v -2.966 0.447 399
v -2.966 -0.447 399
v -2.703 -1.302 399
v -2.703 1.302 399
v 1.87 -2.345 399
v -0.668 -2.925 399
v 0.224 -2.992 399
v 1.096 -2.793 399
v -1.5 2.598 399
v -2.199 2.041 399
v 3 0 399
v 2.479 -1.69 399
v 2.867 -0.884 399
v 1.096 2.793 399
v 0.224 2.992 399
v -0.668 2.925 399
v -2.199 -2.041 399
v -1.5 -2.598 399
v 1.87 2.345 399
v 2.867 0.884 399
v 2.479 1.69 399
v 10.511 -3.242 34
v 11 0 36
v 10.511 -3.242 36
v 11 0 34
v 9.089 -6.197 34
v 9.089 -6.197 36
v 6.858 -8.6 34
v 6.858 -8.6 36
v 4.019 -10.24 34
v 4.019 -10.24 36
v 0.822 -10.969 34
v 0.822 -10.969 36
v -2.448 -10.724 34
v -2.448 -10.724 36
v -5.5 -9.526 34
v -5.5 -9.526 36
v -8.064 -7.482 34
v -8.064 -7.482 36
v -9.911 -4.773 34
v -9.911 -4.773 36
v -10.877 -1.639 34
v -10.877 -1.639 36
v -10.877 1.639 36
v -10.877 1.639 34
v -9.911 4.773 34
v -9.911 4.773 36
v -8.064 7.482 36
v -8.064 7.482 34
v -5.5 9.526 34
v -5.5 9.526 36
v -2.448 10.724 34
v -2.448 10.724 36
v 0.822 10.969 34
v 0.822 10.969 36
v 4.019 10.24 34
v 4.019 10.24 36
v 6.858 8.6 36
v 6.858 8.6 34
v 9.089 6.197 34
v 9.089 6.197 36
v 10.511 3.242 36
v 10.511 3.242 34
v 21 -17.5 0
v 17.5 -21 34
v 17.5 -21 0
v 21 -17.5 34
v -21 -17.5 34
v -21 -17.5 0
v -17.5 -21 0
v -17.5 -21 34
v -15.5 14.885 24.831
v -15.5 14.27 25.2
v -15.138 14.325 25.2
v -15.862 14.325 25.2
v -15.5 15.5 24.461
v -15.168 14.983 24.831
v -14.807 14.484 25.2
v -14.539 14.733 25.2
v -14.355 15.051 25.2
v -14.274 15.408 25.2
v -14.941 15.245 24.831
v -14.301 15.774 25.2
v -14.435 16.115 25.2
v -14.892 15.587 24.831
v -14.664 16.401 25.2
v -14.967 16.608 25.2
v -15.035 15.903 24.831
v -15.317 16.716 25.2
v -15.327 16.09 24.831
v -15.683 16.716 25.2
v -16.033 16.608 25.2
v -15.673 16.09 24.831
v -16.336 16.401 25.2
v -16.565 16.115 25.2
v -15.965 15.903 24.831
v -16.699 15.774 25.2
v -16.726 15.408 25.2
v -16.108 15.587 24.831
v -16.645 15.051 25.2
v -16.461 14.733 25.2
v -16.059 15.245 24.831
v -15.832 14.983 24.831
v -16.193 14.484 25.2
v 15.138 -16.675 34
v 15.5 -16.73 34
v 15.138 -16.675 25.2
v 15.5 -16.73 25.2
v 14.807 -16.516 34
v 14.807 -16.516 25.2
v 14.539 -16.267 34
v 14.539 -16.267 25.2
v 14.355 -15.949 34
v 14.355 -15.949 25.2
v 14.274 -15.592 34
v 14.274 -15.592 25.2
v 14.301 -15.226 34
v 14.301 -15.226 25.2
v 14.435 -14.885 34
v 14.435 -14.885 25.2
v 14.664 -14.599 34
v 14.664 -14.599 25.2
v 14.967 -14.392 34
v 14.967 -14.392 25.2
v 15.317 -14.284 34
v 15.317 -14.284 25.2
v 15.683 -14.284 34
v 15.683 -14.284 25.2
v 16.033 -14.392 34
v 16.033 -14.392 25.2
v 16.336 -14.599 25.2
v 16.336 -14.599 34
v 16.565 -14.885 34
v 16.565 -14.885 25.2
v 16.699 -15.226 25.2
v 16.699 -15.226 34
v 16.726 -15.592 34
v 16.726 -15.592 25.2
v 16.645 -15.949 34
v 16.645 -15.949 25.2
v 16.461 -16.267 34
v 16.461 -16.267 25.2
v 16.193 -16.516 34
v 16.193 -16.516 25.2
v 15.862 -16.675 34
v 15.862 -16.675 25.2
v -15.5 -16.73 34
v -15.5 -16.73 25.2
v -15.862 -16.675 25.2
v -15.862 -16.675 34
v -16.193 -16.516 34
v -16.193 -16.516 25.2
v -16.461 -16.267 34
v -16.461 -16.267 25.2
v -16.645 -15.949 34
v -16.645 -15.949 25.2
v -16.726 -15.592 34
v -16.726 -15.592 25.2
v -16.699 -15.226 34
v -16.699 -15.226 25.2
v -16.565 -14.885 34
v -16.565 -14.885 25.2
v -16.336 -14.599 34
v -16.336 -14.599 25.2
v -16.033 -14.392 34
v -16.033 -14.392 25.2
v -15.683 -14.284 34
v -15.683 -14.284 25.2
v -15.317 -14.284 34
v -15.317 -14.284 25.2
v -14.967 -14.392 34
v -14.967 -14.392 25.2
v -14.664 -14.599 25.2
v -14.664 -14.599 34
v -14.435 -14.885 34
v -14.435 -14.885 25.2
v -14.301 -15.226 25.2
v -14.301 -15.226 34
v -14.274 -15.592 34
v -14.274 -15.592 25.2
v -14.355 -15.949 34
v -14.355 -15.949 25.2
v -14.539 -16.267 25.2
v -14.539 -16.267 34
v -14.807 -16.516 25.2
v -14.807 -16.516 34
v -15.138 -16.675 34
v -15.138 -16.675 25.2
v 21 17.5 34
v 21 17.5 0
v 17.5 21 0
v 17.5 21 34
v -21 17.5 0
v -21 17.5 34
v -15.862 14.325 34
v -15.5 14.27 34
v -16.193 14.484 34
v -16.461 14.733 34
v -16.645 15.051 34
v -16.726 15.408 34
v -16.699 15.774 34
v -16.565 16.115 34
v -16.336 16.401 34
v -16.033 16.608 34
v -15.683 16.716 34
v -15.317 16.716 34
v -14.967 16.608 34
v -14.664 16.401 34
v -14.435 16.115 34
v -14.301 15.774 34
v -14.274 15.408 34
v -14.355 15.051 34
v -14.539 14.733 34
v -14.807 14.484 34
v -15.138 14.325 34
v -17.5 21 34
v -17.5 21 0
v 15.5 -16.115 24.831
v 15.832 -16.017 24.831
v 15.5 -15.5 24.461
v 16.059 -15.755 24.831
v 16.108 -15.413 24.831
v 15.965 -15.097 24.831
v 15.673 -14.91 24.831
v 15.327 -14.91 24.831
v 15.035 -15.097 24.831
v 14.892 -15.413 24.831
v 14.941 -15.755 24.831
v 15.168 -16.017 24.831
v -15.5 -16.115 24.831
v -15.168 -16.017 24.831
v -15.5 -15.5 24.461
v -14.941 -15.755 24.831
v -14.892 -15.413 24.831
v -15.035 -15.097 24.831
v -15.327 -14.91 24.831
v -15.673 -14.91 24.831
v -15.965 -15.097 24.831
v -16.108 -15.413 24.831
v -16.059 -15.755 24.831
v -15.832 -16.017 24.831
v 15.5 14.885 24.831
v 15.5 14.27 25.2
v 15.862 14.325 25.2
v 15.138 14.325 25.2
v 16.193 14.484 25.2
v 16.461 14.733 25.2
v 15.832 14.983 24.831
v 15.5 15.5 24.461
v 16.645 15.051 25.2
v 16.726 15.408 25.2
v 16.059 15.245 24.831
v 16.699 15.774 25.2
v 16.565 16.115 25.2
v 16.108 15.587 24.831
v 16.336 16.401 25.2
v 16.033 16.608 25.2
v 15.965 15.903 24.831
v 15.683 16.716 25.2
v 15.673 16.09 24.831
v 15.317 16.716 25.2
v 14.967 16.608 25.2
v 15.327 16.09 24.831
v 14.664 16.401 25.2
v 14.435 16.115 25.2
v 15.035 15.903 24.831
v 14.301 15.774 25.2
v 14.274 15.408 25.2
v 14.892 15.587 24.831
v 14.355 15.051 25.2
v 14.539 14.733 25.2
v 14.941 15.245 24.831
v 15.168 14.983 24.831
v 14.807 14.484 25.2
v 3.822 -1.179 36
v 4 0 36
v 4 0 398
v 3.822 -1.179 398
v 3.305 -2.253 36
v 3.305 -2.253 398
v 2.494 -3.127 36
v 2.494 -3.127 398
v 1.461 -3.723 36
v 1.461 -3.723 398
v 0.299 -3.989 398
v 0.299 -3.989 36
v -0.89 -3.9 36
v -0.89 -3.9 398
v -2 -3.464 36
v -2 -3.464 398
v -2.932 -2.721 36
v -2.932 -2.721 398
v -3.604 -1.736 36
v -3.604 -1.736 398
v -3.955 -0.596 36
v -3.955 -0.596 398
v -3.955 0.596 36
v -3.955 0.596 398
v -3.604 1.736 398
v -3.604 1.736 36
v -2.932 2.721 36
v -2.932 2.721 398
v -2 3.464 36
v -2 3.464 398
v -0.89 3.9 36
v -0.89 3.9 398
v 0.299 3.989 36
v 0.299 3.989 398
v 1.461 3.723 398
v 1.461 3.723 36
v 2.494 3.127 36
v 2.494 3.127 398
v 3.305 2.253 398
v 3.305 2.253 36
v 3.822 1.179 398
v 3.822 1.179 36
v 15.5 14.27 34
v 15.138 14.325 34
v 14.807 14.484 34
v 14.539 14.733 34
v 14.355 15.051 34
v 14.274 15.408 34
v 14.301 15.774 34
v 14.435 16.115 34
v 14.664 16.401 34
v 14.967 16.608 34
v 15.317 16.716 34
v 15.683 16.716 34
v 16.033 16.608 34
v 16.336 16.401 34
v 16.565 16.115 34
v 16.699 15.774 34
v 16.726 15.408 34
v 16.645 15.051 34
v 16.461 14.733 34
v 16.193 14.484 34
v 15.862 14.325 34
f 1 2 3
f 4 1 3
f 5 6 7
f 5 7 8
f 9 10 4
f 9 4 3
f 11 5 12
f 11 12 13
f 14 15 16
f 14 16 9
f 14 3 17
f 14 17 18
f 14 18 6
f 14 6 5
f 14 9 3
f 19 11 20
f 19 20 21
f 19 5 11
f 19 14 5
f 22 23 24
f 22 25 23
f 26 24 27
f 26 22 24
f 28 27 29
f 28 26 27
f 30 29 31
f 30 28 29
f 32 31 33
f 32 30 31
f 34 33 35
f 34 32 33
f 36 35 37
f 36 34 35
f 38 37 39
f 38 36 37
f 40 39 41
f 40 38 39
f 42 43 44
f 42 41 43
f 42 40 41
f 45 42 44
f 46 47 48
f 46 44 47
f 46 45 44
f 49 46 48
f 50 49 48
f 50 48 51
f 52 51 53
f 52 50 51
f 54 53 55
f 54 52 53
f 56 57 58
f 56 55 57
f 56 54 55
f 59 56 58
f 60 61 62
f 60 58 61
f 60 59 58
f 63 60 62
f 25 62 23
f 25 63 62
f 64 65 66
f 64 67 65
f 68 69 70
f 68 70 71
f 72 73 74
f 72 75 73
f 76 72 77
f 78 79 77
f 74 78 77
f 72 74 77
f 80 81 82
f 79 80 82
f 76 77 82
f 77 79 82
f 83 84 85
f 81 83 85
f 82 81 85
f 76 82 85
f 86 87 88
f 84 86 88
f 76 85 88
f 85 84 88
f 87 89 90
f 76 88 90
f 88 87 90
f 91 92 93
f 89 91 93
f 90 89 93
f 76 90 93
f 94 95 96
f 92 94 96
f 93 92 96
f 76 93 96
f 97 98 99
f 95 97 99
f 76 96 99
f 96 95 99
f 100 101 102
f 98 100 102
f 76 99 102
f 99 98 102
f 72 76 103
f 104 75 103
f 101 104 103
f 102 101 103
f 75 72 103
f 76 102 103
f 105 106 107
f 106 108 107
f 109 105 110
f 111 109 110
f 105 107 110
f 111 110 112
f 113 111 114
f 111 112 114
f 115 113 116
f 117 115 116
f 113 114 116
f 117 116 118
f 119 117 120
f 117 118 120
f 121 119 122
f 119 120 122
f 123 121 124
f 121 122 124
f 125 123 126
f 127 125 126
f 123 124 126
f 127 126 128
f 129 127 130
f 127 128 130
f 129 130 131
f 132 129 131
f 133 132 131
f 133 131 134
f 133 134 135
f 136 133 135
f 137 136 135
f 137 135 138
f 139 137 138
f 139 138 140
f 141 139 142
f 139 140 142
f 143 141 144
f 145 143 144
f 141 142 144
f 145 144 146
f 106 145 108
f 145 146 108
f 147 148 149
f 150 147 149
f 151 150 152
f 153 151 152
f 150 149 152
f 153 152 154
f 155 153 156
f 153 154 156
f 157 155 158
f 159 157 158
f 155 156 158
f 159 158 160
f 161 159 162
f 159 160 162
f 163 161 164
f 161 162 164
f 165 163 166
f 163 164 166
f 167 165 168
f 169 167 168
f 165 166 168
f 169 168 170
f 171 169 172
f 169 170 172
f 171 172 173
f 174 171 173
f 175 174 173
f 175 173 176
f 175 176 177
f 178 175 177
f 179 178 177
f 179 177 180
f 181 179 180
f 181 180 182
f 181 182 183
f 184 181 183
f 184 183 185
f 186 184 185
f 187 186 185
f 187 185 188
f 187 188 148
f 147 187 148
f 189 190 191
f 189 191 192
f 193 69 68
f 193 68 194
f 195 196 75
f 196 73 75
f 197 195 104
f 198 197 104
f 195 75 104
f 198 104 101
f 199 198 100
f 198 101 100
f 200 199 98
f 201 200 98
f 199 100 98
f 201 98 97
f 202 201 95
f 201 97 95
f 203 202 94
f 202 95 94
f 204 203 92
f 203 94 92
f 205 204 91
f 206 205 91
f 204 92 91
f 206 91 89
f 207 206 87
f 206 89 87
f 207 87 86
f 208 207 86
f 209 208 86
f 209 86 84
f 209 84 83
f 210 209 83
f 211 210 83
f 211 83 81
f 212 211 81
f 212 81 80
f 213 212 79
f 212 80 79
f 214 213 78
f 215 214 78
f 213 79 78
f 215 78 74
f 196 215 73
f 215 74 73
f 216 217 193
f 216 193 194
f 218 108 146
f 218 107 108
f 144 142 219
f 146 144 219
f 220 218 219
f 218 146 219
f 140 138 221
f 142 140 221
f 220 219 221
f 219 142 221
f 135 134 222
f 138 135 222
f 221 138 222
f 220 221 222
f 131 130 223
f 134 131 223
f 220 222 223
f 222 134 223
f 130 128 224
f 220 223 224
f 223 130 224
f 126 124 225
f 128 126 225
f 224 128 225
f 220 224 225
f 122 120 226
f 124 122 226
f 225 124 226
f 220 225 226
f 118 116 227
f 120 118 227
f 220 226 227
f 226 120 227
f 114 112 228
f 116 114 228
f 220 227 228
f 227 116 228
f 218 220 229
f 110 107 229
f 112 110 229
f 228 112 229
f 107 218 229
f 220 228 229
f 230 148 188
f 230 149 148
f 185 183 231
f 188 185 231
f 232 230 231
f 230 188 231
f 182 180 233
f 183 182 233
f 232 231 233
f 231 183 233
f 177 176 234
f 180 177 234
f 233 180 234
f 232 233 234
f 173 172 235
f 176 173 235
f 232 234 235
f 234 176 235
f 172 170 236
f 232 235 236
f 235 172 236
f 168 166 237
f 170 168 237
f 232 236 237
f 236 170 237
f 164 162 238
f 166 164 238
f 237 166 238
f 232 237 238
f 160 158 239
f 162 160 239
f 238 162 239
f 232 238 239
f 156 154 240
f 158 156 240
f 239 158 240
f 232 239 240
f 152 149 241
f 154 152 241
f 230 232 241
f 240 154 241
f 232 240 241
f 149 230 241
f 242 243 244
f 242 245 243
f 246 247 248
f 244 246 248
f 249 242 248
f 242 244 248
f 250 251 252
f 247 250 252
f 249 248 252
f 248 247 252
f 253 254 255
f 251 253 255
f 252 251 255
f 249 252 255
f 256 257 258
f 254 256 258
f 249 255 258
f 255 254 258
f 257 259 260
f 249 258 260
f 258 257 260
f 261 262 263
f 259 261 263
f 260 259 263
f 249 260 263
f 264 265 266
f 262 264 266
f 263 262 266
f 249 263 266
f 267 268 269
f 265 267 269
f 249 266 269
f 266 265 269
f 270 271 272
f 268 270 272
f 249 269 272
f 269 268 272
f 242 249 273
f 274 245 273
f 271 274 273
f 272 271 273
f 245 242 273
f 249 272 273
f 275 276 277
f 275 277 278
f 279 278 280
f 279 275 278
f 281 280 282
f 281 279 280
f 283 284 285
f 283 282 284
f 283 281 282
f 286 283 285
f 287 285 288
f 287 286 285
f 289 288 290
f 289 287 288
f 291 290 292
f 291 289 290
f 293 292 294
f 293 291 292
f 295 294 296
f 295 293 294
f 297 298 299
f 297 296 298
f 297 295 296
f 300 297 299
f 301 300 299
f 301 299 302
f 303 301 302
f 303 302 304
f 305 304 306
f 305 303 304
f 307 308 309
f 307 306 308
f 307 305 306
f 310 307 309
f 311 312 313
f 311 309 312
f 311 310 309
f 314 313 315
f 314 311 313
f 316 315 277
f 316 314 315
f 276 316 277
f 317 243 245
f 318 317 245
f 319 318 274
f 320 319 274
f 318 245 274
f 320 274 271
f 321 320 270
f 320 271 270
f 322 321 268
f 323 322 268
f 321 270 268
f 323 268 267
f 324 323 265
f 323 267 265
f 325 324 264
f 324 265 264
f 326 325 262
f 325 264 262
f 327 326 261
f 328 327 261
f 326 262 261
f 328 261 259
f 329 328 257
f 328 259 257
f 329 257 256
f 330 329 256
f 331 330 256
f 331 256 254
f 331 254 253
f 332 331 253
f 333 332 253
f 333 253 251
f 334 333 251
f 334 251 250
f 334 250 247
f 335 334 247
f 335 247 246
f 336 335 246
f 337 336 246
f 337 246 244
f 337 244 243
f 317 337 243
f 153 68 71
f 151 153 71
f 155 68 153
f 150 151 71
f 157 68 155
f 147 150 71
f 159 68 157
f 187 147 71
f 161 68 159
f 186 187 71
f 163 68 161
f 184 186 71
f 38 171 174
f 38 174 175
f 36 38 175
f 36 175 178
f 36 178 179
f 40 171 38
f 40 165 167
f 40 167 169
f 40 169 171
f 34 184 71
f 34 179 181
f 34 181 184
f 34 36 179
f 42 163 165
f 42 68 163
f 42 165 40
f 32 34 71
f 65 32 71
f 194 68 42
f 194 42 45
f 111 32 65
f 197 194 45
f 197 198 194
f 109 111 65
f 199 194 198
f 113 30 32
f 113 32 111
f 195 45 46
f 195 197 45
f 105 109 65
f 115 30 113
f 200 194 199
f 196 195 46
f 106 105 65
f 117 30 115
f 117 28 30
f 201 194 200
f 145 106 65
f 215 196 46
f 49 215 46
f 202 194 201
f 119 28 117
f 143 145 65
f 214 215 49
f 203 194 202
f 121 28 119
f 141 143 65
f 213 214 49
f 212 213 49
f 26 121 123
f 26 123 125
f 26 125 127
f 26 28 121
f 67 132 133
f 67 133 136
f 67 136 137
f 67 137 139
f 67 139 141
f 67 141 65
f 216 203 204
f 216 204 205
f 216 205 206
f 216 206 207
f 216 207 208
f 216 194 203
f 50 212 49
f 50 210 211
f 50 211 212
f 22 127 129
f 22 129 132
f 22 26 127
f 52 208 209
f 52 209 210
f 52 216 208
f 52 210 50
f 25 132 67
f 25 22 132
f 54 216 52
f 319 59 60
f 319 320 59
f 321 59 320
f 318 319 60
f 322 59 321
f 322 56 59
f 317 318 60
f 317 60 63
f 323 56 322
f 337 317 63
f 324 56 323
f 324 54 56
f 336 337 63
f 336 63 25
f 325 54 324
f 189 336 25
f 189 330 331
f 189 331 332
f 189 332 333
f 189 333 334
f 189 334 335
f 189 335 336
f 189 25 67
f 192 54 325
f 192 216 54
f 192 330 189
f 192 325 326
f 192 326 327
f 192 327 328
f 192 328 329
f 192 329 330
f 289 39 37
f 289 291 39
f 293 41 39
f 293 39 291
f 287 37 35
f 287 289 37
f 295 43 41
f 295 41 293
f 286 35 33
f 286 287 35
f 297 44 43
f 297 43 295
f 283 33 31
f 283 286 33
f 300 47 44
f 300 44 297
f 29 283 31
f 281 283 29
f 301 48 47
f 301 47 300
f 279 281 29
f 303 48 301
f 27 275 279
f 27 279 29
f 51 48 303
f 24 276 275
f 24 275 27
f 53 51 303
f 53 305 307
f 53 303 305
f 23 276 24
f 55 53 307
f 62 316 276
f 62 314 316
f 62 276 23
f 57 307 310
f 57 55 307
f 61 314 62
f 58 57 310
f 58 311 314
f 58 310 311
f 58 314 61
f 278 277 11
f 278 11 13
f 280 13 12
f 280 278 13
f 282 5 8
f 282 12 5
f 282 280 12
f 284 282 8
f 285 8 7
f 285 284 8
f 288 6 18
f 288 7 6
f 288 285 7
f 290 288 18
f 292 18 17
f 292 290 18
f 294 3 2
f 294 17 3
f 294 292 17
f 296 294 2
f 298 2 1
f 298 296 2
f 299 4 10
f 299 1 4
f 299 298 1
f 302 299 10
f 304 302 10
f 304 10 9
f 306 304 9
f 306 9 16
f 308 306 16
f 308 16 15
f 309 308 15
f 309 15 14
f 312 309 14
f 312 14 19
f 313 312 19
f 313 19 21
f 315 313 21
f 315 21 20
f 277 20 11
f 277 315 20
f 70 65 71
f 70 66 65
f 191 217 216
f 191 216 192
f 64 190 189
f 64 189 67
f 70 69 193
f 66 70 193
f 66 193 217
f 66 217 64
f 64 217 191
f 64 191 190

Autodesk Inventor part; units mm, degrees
ref_plane "YZ Plane" through (0, 0, 0) normal (1, 0, 0) x (0, 1, 0)
ref_plane "XZ Plane" through (0, 0, 0) normal (0, 1, 0) x (-1, 0, 0)
ref_plane "XY Plane" through (0, 0, 0) normal (0, 0, 1) x (1, 0, 0)
sketch "Sketch1" plane through (0, 0, 0) normal (0, 0, 1) x (1, 0, 0)
  line L0 (21, -21) -> (-21, -21)
  line L1 (-21, -21) -> (-21, 21)
  line L2 (-21, 21) -> (21, 21)
  line L3 (21, 21) -> (21, -21)
  line L4 (21, -21) -> (-21, 21) construction
  line L5 (-21, -21) -> (21, 21) construction
  point P0 (0, 0)
  dimension "d0" = 42
extrude "Extrusion1" add sketch "Sketch1" along normal blind 34
chamfer "Chamfer1" distance 3.5 angle 45 4 edges at (-21, 21, 17) (21, 21, 17) (21, -21, 17) (-21, -21, 17)
sketch "Sketch2" plane through (0, 0, 34) normal (0, 0, 1) x (1, 0, 0)
  circle A0 centre (0, 0) radius 11
  dimension "d6" = 22
extrude "Extrusion2" add sketch "Sketch2" along normal blind 2
sketch "Sketch3" plane through (0, 0, 36) normal (0, 0, 1) x (1, 0, 0)
  circle A0 centre (0, 0) radius 4
  dimension "d9" = 8
extrude "Extrusion3" add sketch "Sketch3" along normal blind 363
thread "Thread1" size "M8x1.25" class "6g" standard "ANSI Metric M Profile" full length
chamfer "Chamfer2" distance 1 angle 45 1 edges at (-4, 0, 399)
sketch "Sketch4" plane through (0, 0, 34) normal (0, 0, 1) x (1, 0, 0)
  line L0 (-17.5, -21) -> (17.5, -21) projected
  line L1 (17.5, 21) -> (-17.5, 21) projected
  line L2 (-21, 17.5) -> (-21, -17.5) projected
  point P0 (0, 0)
  point P1 (-15.5, 15.5)
  point P2 (-15.5, -15.5)
  point P3 (15.5, -15.5)
  point P4 (15.5, 15.5)
  dimension "d17" = 31
  dimension "d18" = 31
  dimension "d19" = 42
  dimension "d21" = 5.5
  dimension "d22" = 5.5
hole "Hole1" at (-15.5, 15.5, 34) at (-15.5, -15.5, 34) at (15.5, -15.5, 34) at (15.5, 15.5, 34) direction (0, 0, -1) diameter 2.459 depth 8.8 tip angle 118 thread size "M3x0.5" class "6H" standard "ISO Metric profile"
equation "\"d21\" = -0.5 * d18 + 0.5 * d19"
equation "\"d22\" = -0.5 * d18 + 0.5 * d19"
properties part number "Motor_Z" material "Steel, Alloy"
